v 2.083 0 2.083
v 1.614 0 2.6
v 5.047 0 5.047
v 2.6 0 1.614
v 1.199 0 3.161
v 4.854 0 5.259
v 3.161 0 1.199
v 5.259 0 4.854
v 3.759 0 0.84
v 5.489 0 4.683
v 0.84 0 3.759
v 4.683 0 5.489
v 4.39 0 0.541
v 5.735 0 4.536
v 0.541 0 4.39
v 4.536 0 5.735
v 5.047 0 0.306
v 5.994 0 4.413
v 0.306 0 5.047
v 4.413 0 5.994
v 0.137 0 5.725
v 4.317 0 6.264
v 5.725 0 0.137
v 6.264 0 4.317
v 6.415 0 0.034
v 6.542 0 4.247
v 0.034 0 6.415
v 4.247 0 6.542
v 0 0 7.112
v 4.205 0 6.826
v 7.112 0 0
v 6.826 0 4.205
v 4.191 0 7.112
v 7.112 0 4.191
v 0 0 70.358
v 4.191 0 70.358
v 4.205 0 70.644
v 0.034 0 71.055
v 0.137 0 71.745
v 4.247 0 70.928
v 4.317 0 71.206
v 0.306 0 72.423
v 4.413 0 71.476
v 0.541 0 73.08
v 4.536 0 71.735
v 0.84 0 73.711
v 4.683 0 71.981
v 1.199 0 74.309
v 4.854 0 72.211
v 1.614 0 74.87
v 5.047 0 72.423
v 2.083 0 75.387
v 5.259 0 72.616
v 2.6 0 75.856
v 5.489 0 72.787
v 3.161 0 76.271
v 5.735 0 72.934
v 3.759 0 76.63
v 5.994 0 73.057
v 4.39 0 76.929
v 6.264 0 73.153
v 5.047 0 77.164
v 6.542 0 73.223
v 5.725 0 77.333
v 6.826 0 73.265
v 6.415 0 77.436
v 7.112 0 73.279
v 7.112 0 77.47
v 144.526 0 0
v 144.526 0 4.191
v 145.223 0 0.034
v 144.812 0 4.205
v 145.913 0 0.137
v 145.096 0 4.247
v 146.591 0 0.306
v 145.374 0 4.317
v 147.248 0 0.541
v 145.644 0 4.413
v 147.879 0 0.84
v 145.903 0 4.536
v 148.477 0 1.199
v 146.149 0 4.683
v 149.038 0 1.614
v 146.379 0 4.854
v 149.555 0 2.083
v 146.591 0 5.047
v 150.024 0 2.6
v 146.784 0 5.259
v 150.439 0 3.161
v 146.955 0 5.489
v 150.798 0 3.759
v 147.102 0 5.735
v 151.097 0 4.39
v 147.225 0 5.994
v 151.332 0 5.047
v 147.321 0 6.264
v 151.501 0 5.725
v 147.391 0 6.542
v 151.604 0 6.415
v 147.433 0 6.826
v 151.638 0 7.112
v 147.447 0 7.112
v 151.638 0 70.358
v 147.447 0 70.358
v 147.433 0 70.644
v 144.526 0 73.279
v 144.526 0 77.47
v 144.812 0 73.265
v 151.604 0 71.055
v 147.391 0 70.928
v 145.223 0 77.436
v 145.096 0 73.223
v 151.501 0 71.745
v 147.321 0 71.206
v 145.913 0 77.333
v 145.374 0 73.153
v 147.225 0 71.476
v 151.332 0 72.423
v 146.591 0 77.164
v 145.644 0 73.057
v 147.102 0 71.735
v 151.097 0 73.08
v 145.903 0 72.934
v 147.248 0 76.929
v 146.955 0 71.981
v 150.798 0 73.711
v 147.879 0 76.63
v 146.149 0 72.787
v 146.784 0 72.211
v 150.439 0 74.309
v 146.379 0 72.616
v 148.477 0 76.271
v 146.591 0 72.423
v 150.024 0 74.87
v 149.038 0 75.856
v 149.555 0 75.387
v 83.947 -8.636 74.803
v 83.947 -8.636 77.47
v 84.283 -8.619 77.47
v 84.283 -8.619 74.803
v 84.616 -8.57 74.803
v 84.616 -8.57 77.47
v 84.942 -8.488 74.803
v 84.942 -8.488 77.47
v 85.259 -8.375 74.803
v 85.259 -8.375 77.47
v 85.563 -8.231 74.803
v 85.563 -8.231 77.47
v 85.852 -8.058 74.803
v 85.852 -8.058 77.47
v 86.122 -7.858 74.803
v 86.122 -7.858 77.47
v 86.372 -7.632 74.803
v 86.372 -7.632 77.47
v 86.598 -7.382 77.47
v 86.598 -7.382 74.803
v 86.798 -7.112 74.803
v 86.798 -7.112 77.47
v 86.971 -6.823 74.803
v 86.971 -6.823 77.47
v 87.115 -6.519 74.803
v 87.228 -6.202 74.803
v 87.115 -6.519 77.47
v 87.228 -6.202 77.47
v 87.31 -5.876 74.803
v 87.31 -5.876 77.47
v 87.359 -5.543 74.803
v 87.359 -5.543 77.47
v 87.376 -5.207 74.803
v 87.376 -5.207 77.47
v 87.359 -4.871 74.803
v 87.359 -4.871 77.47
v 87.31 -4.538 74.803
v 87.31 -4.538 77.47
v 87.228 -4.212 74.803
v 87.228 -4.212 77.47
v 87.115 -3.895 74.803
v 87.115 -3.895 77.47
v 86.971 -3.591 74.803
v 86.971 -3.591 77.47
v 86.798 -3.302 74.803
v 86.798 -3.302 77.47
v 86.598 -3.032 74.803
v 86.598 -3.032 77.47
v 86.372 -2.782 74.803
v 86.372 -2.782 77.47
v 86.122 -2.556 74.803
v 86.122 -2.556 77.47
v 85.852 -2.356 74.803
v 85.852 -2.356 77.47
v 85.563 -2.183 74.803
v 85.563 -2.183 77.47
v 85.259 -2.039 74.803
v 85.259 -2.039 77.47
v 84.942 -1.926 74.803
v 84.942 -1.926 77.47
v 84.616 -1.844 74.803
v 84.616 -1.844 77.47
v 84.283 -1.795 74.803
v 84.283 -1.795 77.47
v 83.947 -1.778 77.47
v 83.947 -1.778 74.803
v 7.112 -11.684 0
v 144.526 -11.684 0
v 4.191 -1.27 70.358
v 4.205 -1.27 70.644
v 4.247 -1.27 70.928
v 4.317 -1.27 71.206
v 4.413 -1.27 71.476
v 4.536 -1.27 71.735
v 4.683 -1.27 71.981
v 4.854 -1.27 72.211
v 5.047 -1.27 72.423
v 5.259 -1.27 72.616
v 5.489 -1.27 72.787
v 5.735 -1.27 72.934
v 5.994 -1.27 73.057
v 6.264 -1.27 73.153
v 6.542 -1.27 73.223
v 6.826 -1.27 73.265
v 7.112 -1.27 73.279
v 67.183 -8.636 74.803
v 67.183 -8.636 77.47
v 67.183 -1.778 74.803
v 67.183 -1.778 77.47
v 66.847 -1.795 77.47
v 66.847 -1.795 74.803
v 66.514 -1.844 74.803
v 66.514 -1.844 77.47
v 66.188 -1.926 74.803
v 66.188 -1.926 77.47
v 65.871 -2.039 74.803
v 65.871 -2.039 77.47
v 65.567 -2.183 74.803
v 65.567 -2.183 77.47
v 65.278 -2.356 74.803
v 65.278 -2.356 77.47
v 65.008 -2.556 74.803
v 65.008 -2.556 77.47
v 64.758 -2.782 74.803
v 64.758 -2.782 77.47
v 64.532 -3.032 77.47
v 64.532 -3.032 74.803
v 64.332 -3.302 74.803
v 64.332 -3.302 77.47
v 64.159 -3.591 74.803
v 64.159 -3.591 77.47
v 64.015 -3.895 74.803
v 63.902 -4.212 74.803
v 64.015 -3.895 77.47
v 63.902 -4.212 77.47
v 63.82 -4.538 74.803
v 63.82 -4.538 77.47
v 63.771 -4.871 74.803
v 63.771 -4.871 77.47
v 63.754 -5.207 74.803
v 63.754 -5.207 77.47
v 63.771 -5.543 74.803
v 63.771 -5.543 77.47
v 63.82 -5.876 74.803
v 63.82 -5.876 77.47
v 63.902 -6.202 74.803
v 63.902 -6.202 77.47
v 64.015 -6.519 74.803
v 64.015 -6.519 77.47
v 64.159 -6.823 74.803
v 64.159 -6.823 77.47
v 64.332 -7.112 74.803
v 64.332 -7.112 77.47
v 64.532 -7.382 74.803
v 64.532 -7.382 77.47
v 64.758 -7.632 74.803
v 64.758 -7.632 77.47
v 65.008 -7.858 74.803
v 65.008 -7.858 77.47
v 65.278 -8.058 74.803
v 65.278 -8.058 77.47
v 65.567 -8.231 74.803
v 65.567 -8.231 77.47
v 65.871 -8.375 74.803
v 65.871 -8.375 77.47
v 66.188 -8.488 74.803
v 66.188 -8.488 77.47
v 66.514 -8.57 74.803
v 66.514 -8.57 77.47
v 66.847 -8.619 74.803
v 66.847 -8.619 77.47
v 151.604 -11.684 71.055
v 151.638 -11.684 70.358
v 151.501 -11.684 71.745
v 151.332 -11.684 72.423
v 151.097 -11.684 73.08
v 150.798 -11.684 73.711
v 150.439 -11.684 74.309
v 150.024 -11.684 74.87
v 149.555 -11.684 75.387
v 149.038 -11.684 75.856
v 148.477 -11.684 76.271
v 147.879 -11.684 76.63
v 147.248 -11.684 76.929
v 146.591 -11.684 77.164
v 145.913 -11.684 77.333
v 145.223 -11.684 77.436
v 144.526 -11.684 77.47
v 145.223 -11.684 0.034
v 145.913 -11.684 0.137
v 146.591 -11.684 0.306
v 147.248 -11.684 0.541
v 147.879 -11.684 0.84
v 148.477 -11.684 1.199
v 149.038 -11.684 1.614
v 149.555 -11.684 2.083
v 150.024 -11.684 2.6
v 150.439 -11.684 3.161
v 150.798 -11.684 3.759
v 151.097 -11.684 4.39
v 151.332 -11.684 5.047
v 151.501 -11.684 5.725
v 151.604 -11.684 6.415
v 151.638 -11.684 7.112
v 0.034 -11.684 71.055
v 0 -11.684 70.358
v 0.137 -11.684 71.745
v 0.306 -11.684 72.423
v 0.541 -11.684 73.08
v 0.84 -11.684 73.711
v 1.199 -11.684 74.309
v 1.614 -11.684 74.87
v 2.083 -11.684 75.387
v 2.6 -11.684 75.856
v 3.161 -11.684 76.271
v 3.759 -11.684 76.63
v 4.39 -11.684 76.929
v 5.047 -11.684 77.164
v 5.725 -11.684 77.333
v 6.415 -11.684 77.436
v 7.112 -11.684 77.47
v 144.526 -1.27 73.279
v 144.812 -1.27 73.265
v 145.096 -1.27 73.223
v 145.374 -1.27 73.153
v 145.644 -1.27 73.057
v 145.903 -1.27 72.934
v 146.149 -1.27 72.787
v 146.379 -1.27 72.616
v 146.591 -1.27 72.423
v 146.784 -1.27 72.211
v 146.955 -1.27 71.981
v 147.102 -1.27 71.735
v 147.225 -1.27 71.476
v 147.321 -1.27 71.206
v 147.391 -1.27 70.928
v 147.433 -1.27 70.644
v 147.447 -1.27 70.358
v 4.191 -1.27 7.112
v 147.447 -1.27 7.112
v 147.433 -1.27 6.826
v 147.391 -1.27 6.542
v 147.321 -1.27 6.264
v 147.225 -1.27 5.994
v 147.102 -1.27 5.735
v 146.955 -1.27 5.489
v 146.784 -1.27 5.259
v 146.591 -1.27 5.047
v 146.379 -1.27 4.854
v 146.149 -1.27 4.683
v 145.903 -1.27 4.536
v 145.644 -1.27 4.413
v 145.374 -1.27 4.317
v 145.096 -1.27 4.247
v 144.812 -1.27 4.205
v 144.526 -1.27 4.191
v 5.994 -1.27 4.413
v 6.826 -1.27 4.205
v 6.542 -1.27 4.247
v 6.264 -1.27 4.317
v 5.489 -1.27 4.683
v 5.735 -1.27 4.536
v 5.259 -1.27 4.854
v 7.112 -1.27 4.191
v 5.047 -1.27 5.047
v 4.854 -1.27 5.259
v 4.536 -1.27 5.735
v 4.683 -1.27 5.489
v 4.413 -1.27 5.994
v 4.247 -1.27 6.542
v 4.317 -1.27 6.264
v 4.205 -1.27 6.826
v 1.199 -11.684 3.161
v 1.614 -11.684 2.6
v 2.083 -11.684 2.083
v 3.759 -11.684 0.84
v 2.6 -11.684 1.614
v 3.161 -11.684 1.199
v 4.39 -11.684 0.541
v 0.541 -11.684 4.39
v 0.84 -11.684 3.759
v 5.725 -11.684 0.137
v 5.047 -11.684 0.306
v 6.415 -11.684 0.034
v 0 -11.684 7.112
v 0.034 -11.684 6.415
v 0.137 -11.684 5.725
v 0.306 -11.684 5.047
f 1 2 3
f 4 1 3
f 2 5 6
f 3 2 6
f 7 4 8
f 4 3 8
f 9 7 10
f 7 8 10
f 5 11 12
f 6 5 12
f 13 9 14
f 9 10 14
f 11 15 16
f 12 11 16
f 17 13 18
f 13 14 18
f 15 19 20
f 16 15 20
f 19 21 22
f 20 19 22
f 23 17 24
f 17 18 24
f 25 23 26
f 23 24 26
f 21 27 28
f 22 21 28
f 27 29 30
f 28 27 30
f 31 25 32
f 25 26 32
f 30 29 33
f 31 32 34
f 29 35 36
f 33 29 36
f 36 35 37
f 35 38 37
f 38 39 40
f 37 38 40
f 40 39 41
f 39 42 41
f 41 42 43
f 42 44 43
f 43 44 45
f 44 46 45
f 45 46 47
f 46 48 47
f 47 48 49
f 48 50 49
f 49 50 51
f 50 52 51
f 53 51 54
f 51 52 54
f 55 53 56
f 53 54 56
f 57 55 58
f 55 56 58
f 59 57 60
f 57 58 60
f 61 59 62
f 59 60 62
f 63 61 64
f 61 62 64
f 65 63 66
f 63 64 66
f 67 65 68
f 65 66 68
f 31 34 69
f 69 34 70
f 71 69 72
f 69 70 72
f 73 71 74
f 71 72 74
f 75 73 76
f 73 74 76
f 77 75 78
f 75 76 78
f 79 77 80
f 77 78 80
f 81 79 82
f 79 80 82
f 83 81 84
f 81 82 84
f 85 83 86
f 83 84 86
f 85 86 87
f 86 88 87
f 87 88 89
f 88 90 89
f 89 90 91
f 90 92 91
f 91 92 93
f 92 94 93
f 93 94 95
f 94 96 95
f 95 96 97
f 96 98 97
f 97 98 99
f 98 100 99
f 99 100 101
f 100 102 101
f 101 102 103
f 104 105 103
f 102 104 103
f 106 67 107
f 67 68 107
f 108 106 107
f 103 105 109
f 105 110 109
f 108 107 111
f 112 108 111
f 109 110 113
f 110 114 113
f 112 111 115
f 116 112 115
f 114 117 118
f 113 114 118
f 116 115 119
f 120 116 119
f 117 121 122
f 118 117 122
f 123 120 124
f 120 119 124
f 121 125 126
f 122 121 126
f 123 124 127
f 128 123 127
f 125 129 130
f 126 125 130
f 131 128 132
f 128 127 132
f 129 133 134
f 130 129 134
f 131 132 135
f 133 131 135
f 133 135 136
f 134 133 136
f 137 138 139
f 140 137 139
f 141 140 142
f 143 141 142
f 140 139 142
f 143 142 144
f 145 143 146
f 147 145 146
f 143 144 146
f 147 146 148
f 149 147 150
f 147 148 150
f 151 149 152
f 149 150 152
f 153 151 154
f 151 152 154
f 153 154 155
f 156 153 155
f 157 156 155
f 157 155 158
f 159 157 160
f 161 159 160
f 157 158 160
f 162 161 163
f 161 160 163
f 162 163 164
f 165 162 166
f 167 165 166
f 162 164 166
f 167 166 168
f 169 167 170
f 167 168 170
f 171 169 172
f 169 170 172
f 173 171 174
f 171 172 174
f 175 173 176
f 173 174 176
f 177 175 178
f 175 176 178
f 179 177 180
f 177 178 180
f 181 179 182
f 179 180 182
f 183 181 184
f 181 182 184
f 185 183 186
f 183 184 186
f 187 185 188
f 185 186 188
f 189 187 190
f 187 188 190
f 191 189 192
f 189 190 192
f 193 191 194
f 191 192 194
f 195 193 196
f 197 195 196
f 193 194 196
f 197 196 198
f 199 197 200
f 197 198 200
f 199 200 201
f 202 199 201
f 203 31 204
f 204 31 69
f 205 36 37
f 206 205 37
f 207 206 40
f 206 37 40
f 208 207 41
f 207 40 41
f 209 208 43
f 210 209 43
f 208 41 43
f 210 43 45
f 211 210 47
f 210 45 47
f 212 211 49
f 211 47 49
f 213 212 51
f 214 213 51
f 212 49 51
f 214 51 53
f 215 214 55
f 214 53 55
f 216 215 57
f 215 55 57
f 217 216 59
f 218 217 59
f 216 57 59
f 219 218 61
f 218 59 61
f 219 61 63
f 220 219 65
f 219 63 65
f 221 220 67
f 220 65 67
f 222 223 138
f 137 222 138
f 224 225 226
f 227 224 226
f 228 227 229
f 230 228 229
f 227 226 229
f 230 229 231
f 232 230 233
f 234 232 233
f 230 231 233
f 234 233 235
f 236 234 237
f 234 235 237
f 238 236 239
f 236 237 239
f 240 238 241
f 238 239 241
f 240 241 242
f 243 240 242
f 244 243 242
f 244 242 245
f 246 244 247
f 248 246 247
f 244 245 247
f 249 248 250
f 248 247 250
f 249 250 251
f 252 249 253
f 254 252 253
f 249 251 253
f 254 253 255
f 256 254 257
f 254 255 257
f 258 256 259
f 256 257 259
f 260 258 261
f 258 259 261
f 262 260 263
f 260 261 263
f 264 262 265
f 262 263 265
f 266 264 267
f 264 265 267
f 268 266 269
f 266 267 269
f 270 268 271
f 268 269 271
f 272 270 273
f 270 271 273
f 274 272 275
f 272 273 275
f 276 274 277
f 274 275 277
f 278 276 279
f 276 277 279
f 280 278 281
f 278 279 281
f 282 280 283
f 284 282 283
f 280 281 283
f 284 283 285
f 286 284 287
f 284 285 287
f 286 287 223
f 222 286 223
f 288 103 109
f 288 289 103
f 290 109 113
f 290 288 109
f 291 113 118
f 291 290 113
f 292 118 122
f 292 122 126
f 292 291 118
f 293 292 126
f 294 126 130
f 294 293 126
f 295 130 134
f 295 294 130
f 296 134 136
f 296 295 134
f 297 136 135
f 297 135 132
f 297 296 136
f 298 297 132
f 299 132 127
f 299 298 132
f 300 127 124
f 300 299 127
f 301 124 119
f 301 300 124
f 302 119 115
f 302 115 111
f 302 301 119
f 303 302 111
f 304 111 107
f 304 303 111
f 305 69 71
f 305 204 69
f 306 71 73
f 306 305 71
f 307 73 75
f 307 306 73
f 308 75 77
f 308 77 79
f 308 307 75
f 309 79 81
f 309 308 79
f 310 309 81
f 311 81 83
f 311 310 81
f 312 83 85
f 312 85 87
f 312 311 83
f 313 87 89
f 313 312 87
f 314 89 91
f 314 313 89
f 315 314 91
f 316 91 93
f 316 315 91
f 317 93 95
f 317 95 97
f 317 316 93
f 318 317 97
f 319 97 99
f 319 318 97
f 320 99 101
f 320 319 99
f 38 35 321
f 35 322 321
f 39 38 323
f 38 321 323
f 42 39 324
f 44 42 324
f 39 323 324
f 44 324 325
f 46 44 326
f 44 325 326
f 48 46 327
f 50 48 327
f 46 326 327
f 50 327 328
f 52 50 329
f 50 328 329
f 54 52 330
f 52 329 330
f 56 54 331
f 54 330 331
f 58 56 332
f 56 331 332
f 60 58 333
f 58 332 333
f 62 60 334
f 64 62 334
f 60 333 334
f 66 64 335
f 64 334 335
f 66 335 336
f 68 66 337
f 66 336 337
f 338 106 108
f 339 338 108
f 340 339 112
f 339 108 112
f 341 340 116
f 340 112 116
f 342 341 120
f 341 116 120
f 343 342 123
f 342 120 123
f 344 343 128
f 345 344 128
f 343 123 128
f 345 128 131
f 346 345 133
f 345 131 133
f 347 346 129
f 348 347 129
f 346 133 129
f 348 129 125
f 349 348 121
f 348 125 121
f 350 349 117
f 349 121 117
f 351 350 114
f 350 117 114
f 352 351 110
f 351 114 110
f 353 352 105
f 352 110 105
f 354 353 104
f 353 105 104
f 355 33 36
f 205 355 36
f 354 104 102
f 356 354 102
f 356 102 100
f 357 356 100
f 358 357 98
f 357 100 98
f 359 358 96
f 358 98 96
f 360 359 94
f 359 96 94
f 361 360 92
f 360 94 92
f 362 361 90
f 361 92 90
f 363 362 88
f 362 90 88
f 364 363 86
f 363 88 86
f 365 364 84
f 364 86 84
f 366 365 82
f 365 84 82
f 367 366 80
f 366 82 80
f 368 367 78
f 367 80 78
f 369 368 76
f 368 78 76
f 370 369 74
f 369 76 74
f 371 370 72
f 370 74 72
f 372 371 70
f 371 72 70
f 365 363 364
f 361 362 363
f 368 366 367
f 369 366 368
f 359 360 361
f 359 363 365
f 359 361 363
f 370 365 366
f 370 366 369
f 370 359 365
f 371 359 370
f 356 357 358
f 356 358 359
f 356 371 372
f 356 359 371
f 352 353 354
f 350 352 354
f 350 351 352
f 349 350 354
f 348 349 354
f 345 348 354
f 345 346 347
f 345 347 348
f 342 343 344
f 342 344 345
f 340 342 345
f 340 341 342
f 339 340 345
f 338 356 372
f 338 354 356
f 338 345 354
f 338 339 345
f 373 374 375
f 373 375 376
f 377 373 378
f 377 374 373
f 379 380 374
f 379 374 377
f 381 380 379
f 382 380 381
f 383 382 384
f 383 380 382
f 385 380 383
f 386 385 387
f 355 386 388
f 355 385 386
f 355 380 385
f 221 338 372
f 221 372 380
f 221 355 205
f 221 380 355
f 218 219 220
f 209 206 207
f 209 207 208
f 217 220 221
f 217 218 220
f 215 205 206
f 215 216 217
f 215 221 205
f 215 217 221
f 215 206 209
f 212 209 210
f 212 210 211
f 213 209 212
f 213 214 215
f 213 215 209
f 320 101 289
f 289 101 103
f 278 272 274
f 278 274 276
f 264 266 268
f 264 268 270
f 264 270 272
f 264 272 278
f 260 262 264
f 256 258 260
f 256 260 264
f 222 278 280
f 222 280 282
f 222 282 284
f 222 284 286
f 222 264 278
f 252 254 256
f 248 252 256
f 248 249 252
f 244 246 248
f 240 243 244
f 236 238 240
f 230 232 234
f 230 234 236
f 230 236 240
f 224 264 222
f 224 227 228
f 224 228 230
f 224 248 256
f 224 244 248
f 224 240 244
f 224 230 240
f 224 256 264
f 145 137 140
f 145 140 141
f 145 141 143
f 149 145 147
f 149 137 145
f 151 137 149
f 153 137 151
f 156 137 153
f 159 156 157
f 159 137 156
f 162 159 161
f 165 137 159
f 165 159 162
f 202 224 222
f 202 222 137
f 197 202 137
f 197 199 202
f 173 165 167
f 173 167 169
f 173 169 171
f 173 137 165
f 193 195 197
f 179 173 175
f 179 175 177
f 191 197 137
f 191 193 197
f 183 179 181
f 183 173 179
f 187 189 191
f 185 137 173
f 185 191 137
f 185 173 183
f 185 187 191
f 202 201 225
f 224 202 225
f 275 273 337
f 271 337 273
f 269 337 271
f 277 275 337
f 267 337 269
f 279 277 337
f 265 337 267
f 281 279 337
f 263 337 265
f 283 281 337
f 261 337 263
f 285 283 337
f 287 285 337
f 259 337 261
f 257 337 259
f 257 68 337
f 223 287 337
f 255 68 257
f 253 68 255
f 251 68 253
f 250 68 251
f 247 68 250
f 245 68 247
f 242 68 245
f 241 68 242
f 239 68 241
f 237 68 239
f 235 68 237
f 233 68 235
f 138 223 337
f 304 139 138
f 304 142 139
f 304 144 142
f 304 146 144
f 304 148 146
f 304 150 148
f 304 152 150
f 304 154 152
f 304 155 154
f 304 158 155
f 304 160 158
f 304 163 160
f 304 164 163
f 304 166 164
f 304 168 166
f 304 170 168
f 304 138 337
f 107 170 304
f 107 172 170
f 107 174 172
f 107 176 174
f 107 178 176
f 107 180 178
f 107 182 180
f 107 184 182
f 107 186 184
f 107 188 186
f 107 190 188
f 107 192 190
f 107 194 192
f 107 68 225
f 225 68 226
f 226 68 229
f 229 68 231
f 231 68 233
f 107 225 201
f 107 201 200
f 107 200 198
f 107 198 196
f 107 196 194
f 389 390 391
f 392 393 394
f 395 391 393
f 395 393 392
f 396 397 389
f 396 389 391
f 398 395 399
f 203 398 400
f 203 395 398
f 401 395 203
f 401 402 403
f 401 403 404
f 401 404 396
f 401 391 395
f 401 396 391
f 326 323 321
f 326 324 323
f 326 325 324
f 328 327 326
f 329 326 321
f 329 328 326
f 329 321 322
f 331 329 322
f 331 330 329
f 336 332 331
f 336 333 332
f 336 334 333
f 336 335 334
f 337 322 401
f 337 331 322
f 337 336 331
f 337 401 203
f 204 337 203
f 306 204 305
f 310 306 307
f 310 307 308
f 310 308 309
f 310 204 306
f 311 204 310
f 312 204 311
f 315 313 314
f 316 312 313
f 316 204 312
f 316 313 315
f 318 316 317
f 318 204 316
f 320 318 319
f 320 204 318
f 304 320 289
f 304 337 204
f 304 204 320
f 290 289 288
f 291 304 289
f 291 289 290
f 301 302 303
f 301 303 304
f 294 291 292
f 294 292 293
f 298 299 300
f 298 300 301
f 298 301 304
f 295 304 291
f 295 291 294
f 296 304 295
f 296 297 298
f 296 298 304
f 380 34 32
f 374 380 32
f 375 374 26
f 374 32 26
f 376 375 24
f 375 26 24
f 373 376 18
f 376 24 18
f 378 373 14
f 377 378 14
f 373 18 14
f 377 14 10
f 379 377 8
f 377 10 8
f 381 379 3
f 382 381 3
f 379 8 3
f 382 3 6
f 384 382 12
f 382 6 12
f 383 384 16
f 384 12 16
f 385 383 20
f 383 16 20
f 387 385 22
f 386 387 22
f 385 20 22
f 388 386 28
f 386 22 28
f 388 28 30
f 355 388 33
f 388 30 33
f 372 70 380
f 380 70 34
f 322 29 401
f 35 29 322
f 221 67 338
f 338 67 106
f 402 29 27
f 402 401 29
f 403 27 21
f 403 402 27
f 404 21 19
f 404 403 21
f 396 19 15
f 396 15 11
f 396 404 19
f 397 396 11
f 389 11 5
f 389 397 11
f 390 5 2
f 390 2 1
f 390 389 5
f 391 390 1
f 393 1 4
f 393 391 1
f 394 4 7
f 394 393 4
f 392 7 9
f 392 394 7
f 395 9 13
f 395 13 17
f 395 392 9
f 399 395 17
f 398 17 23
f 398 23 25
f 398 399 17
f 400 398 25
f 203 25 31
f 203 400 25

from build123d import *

# Parameters (mm, degrees)
F0_W     = 151.638
F0_H     = 77.47
F1_DEPTH = 11.684
F2_R     = 7.112
F4_DEPTH = 2.667
F6_DEPTH = 1.27


with BuildPart() as f1:
    # F0 (on Front) → F1 (new body)
    with BuildSketch(Plane.XZ):
        with Locations((75.819, 38.735)):
            Rectangle(F0_W, F0_H)
    extrude(amount=F1_DEPTH)

    # F2
    f2_edges = [f1.edges().sort_by_distance(p)[0] for p in [
        (0, -5.842, 77.47),
        (151.638, -5.842, 77.47),
        (151.638, -5.842, 0),
        (0, -5.842, 0),
    ]]
    fillet(f2_edges, radius=F2_R)

    # F3 (on face) → F4 (cut)
    with BuildSketch(Plane.XY.offset(77.47)):
        with BuildLine():
            Line((83.947, -1.778), (67.183, -1.778))
            ThreePointArc((67.183, -1.778), (63.754, -5.207), (67.183, -8.636))
            Line((67.183, -8.636), (83.947, -8.636))
            ThreePointArc((83.947, -8.636), (87.376, -5.207), (83.947, -1.778))
        make_face()
    extrude(amount=-F4_DEPTH, mode=Mode.SUBTRACT)

    # F5 (on face) → F6 (cut)
    with BuildSketch(Plane(origin=(0, 0, 0), x_dir=(-1, 0, 0), z_dir=(0, 1, 0))):
        with BuildLine():
            Line((-147.447, 70.358), (-147.447, 7.112))
            ThreePointArc((-147.447, 7.112), (-146.591459, 5.046541), (-144.526, 4.191))
            Line((-144.526, 4.191), (-7.112, 4.191))
            ThreePointArc((-7.112, 4.191), (-5.046541, 5.046541), (-4.191, 7.112))
            Line((-4.191, 7.112), (-4.191, 70.358))
            ThreePointArc((-4.191, 70.358), (-5.046541, 72.423459), (-7.112, 73.279))
            Line((-7.112, 73.279), (-144.526, 73.279))
            ThreePointArc((-144.526, 73.279), (-146.591459, 72.423459), (-147.447, 70.358))
        make_face()
    extrude(amount=-F6_DEPTH, mode=Mode.SUBTRACT)


solid = f1.part
